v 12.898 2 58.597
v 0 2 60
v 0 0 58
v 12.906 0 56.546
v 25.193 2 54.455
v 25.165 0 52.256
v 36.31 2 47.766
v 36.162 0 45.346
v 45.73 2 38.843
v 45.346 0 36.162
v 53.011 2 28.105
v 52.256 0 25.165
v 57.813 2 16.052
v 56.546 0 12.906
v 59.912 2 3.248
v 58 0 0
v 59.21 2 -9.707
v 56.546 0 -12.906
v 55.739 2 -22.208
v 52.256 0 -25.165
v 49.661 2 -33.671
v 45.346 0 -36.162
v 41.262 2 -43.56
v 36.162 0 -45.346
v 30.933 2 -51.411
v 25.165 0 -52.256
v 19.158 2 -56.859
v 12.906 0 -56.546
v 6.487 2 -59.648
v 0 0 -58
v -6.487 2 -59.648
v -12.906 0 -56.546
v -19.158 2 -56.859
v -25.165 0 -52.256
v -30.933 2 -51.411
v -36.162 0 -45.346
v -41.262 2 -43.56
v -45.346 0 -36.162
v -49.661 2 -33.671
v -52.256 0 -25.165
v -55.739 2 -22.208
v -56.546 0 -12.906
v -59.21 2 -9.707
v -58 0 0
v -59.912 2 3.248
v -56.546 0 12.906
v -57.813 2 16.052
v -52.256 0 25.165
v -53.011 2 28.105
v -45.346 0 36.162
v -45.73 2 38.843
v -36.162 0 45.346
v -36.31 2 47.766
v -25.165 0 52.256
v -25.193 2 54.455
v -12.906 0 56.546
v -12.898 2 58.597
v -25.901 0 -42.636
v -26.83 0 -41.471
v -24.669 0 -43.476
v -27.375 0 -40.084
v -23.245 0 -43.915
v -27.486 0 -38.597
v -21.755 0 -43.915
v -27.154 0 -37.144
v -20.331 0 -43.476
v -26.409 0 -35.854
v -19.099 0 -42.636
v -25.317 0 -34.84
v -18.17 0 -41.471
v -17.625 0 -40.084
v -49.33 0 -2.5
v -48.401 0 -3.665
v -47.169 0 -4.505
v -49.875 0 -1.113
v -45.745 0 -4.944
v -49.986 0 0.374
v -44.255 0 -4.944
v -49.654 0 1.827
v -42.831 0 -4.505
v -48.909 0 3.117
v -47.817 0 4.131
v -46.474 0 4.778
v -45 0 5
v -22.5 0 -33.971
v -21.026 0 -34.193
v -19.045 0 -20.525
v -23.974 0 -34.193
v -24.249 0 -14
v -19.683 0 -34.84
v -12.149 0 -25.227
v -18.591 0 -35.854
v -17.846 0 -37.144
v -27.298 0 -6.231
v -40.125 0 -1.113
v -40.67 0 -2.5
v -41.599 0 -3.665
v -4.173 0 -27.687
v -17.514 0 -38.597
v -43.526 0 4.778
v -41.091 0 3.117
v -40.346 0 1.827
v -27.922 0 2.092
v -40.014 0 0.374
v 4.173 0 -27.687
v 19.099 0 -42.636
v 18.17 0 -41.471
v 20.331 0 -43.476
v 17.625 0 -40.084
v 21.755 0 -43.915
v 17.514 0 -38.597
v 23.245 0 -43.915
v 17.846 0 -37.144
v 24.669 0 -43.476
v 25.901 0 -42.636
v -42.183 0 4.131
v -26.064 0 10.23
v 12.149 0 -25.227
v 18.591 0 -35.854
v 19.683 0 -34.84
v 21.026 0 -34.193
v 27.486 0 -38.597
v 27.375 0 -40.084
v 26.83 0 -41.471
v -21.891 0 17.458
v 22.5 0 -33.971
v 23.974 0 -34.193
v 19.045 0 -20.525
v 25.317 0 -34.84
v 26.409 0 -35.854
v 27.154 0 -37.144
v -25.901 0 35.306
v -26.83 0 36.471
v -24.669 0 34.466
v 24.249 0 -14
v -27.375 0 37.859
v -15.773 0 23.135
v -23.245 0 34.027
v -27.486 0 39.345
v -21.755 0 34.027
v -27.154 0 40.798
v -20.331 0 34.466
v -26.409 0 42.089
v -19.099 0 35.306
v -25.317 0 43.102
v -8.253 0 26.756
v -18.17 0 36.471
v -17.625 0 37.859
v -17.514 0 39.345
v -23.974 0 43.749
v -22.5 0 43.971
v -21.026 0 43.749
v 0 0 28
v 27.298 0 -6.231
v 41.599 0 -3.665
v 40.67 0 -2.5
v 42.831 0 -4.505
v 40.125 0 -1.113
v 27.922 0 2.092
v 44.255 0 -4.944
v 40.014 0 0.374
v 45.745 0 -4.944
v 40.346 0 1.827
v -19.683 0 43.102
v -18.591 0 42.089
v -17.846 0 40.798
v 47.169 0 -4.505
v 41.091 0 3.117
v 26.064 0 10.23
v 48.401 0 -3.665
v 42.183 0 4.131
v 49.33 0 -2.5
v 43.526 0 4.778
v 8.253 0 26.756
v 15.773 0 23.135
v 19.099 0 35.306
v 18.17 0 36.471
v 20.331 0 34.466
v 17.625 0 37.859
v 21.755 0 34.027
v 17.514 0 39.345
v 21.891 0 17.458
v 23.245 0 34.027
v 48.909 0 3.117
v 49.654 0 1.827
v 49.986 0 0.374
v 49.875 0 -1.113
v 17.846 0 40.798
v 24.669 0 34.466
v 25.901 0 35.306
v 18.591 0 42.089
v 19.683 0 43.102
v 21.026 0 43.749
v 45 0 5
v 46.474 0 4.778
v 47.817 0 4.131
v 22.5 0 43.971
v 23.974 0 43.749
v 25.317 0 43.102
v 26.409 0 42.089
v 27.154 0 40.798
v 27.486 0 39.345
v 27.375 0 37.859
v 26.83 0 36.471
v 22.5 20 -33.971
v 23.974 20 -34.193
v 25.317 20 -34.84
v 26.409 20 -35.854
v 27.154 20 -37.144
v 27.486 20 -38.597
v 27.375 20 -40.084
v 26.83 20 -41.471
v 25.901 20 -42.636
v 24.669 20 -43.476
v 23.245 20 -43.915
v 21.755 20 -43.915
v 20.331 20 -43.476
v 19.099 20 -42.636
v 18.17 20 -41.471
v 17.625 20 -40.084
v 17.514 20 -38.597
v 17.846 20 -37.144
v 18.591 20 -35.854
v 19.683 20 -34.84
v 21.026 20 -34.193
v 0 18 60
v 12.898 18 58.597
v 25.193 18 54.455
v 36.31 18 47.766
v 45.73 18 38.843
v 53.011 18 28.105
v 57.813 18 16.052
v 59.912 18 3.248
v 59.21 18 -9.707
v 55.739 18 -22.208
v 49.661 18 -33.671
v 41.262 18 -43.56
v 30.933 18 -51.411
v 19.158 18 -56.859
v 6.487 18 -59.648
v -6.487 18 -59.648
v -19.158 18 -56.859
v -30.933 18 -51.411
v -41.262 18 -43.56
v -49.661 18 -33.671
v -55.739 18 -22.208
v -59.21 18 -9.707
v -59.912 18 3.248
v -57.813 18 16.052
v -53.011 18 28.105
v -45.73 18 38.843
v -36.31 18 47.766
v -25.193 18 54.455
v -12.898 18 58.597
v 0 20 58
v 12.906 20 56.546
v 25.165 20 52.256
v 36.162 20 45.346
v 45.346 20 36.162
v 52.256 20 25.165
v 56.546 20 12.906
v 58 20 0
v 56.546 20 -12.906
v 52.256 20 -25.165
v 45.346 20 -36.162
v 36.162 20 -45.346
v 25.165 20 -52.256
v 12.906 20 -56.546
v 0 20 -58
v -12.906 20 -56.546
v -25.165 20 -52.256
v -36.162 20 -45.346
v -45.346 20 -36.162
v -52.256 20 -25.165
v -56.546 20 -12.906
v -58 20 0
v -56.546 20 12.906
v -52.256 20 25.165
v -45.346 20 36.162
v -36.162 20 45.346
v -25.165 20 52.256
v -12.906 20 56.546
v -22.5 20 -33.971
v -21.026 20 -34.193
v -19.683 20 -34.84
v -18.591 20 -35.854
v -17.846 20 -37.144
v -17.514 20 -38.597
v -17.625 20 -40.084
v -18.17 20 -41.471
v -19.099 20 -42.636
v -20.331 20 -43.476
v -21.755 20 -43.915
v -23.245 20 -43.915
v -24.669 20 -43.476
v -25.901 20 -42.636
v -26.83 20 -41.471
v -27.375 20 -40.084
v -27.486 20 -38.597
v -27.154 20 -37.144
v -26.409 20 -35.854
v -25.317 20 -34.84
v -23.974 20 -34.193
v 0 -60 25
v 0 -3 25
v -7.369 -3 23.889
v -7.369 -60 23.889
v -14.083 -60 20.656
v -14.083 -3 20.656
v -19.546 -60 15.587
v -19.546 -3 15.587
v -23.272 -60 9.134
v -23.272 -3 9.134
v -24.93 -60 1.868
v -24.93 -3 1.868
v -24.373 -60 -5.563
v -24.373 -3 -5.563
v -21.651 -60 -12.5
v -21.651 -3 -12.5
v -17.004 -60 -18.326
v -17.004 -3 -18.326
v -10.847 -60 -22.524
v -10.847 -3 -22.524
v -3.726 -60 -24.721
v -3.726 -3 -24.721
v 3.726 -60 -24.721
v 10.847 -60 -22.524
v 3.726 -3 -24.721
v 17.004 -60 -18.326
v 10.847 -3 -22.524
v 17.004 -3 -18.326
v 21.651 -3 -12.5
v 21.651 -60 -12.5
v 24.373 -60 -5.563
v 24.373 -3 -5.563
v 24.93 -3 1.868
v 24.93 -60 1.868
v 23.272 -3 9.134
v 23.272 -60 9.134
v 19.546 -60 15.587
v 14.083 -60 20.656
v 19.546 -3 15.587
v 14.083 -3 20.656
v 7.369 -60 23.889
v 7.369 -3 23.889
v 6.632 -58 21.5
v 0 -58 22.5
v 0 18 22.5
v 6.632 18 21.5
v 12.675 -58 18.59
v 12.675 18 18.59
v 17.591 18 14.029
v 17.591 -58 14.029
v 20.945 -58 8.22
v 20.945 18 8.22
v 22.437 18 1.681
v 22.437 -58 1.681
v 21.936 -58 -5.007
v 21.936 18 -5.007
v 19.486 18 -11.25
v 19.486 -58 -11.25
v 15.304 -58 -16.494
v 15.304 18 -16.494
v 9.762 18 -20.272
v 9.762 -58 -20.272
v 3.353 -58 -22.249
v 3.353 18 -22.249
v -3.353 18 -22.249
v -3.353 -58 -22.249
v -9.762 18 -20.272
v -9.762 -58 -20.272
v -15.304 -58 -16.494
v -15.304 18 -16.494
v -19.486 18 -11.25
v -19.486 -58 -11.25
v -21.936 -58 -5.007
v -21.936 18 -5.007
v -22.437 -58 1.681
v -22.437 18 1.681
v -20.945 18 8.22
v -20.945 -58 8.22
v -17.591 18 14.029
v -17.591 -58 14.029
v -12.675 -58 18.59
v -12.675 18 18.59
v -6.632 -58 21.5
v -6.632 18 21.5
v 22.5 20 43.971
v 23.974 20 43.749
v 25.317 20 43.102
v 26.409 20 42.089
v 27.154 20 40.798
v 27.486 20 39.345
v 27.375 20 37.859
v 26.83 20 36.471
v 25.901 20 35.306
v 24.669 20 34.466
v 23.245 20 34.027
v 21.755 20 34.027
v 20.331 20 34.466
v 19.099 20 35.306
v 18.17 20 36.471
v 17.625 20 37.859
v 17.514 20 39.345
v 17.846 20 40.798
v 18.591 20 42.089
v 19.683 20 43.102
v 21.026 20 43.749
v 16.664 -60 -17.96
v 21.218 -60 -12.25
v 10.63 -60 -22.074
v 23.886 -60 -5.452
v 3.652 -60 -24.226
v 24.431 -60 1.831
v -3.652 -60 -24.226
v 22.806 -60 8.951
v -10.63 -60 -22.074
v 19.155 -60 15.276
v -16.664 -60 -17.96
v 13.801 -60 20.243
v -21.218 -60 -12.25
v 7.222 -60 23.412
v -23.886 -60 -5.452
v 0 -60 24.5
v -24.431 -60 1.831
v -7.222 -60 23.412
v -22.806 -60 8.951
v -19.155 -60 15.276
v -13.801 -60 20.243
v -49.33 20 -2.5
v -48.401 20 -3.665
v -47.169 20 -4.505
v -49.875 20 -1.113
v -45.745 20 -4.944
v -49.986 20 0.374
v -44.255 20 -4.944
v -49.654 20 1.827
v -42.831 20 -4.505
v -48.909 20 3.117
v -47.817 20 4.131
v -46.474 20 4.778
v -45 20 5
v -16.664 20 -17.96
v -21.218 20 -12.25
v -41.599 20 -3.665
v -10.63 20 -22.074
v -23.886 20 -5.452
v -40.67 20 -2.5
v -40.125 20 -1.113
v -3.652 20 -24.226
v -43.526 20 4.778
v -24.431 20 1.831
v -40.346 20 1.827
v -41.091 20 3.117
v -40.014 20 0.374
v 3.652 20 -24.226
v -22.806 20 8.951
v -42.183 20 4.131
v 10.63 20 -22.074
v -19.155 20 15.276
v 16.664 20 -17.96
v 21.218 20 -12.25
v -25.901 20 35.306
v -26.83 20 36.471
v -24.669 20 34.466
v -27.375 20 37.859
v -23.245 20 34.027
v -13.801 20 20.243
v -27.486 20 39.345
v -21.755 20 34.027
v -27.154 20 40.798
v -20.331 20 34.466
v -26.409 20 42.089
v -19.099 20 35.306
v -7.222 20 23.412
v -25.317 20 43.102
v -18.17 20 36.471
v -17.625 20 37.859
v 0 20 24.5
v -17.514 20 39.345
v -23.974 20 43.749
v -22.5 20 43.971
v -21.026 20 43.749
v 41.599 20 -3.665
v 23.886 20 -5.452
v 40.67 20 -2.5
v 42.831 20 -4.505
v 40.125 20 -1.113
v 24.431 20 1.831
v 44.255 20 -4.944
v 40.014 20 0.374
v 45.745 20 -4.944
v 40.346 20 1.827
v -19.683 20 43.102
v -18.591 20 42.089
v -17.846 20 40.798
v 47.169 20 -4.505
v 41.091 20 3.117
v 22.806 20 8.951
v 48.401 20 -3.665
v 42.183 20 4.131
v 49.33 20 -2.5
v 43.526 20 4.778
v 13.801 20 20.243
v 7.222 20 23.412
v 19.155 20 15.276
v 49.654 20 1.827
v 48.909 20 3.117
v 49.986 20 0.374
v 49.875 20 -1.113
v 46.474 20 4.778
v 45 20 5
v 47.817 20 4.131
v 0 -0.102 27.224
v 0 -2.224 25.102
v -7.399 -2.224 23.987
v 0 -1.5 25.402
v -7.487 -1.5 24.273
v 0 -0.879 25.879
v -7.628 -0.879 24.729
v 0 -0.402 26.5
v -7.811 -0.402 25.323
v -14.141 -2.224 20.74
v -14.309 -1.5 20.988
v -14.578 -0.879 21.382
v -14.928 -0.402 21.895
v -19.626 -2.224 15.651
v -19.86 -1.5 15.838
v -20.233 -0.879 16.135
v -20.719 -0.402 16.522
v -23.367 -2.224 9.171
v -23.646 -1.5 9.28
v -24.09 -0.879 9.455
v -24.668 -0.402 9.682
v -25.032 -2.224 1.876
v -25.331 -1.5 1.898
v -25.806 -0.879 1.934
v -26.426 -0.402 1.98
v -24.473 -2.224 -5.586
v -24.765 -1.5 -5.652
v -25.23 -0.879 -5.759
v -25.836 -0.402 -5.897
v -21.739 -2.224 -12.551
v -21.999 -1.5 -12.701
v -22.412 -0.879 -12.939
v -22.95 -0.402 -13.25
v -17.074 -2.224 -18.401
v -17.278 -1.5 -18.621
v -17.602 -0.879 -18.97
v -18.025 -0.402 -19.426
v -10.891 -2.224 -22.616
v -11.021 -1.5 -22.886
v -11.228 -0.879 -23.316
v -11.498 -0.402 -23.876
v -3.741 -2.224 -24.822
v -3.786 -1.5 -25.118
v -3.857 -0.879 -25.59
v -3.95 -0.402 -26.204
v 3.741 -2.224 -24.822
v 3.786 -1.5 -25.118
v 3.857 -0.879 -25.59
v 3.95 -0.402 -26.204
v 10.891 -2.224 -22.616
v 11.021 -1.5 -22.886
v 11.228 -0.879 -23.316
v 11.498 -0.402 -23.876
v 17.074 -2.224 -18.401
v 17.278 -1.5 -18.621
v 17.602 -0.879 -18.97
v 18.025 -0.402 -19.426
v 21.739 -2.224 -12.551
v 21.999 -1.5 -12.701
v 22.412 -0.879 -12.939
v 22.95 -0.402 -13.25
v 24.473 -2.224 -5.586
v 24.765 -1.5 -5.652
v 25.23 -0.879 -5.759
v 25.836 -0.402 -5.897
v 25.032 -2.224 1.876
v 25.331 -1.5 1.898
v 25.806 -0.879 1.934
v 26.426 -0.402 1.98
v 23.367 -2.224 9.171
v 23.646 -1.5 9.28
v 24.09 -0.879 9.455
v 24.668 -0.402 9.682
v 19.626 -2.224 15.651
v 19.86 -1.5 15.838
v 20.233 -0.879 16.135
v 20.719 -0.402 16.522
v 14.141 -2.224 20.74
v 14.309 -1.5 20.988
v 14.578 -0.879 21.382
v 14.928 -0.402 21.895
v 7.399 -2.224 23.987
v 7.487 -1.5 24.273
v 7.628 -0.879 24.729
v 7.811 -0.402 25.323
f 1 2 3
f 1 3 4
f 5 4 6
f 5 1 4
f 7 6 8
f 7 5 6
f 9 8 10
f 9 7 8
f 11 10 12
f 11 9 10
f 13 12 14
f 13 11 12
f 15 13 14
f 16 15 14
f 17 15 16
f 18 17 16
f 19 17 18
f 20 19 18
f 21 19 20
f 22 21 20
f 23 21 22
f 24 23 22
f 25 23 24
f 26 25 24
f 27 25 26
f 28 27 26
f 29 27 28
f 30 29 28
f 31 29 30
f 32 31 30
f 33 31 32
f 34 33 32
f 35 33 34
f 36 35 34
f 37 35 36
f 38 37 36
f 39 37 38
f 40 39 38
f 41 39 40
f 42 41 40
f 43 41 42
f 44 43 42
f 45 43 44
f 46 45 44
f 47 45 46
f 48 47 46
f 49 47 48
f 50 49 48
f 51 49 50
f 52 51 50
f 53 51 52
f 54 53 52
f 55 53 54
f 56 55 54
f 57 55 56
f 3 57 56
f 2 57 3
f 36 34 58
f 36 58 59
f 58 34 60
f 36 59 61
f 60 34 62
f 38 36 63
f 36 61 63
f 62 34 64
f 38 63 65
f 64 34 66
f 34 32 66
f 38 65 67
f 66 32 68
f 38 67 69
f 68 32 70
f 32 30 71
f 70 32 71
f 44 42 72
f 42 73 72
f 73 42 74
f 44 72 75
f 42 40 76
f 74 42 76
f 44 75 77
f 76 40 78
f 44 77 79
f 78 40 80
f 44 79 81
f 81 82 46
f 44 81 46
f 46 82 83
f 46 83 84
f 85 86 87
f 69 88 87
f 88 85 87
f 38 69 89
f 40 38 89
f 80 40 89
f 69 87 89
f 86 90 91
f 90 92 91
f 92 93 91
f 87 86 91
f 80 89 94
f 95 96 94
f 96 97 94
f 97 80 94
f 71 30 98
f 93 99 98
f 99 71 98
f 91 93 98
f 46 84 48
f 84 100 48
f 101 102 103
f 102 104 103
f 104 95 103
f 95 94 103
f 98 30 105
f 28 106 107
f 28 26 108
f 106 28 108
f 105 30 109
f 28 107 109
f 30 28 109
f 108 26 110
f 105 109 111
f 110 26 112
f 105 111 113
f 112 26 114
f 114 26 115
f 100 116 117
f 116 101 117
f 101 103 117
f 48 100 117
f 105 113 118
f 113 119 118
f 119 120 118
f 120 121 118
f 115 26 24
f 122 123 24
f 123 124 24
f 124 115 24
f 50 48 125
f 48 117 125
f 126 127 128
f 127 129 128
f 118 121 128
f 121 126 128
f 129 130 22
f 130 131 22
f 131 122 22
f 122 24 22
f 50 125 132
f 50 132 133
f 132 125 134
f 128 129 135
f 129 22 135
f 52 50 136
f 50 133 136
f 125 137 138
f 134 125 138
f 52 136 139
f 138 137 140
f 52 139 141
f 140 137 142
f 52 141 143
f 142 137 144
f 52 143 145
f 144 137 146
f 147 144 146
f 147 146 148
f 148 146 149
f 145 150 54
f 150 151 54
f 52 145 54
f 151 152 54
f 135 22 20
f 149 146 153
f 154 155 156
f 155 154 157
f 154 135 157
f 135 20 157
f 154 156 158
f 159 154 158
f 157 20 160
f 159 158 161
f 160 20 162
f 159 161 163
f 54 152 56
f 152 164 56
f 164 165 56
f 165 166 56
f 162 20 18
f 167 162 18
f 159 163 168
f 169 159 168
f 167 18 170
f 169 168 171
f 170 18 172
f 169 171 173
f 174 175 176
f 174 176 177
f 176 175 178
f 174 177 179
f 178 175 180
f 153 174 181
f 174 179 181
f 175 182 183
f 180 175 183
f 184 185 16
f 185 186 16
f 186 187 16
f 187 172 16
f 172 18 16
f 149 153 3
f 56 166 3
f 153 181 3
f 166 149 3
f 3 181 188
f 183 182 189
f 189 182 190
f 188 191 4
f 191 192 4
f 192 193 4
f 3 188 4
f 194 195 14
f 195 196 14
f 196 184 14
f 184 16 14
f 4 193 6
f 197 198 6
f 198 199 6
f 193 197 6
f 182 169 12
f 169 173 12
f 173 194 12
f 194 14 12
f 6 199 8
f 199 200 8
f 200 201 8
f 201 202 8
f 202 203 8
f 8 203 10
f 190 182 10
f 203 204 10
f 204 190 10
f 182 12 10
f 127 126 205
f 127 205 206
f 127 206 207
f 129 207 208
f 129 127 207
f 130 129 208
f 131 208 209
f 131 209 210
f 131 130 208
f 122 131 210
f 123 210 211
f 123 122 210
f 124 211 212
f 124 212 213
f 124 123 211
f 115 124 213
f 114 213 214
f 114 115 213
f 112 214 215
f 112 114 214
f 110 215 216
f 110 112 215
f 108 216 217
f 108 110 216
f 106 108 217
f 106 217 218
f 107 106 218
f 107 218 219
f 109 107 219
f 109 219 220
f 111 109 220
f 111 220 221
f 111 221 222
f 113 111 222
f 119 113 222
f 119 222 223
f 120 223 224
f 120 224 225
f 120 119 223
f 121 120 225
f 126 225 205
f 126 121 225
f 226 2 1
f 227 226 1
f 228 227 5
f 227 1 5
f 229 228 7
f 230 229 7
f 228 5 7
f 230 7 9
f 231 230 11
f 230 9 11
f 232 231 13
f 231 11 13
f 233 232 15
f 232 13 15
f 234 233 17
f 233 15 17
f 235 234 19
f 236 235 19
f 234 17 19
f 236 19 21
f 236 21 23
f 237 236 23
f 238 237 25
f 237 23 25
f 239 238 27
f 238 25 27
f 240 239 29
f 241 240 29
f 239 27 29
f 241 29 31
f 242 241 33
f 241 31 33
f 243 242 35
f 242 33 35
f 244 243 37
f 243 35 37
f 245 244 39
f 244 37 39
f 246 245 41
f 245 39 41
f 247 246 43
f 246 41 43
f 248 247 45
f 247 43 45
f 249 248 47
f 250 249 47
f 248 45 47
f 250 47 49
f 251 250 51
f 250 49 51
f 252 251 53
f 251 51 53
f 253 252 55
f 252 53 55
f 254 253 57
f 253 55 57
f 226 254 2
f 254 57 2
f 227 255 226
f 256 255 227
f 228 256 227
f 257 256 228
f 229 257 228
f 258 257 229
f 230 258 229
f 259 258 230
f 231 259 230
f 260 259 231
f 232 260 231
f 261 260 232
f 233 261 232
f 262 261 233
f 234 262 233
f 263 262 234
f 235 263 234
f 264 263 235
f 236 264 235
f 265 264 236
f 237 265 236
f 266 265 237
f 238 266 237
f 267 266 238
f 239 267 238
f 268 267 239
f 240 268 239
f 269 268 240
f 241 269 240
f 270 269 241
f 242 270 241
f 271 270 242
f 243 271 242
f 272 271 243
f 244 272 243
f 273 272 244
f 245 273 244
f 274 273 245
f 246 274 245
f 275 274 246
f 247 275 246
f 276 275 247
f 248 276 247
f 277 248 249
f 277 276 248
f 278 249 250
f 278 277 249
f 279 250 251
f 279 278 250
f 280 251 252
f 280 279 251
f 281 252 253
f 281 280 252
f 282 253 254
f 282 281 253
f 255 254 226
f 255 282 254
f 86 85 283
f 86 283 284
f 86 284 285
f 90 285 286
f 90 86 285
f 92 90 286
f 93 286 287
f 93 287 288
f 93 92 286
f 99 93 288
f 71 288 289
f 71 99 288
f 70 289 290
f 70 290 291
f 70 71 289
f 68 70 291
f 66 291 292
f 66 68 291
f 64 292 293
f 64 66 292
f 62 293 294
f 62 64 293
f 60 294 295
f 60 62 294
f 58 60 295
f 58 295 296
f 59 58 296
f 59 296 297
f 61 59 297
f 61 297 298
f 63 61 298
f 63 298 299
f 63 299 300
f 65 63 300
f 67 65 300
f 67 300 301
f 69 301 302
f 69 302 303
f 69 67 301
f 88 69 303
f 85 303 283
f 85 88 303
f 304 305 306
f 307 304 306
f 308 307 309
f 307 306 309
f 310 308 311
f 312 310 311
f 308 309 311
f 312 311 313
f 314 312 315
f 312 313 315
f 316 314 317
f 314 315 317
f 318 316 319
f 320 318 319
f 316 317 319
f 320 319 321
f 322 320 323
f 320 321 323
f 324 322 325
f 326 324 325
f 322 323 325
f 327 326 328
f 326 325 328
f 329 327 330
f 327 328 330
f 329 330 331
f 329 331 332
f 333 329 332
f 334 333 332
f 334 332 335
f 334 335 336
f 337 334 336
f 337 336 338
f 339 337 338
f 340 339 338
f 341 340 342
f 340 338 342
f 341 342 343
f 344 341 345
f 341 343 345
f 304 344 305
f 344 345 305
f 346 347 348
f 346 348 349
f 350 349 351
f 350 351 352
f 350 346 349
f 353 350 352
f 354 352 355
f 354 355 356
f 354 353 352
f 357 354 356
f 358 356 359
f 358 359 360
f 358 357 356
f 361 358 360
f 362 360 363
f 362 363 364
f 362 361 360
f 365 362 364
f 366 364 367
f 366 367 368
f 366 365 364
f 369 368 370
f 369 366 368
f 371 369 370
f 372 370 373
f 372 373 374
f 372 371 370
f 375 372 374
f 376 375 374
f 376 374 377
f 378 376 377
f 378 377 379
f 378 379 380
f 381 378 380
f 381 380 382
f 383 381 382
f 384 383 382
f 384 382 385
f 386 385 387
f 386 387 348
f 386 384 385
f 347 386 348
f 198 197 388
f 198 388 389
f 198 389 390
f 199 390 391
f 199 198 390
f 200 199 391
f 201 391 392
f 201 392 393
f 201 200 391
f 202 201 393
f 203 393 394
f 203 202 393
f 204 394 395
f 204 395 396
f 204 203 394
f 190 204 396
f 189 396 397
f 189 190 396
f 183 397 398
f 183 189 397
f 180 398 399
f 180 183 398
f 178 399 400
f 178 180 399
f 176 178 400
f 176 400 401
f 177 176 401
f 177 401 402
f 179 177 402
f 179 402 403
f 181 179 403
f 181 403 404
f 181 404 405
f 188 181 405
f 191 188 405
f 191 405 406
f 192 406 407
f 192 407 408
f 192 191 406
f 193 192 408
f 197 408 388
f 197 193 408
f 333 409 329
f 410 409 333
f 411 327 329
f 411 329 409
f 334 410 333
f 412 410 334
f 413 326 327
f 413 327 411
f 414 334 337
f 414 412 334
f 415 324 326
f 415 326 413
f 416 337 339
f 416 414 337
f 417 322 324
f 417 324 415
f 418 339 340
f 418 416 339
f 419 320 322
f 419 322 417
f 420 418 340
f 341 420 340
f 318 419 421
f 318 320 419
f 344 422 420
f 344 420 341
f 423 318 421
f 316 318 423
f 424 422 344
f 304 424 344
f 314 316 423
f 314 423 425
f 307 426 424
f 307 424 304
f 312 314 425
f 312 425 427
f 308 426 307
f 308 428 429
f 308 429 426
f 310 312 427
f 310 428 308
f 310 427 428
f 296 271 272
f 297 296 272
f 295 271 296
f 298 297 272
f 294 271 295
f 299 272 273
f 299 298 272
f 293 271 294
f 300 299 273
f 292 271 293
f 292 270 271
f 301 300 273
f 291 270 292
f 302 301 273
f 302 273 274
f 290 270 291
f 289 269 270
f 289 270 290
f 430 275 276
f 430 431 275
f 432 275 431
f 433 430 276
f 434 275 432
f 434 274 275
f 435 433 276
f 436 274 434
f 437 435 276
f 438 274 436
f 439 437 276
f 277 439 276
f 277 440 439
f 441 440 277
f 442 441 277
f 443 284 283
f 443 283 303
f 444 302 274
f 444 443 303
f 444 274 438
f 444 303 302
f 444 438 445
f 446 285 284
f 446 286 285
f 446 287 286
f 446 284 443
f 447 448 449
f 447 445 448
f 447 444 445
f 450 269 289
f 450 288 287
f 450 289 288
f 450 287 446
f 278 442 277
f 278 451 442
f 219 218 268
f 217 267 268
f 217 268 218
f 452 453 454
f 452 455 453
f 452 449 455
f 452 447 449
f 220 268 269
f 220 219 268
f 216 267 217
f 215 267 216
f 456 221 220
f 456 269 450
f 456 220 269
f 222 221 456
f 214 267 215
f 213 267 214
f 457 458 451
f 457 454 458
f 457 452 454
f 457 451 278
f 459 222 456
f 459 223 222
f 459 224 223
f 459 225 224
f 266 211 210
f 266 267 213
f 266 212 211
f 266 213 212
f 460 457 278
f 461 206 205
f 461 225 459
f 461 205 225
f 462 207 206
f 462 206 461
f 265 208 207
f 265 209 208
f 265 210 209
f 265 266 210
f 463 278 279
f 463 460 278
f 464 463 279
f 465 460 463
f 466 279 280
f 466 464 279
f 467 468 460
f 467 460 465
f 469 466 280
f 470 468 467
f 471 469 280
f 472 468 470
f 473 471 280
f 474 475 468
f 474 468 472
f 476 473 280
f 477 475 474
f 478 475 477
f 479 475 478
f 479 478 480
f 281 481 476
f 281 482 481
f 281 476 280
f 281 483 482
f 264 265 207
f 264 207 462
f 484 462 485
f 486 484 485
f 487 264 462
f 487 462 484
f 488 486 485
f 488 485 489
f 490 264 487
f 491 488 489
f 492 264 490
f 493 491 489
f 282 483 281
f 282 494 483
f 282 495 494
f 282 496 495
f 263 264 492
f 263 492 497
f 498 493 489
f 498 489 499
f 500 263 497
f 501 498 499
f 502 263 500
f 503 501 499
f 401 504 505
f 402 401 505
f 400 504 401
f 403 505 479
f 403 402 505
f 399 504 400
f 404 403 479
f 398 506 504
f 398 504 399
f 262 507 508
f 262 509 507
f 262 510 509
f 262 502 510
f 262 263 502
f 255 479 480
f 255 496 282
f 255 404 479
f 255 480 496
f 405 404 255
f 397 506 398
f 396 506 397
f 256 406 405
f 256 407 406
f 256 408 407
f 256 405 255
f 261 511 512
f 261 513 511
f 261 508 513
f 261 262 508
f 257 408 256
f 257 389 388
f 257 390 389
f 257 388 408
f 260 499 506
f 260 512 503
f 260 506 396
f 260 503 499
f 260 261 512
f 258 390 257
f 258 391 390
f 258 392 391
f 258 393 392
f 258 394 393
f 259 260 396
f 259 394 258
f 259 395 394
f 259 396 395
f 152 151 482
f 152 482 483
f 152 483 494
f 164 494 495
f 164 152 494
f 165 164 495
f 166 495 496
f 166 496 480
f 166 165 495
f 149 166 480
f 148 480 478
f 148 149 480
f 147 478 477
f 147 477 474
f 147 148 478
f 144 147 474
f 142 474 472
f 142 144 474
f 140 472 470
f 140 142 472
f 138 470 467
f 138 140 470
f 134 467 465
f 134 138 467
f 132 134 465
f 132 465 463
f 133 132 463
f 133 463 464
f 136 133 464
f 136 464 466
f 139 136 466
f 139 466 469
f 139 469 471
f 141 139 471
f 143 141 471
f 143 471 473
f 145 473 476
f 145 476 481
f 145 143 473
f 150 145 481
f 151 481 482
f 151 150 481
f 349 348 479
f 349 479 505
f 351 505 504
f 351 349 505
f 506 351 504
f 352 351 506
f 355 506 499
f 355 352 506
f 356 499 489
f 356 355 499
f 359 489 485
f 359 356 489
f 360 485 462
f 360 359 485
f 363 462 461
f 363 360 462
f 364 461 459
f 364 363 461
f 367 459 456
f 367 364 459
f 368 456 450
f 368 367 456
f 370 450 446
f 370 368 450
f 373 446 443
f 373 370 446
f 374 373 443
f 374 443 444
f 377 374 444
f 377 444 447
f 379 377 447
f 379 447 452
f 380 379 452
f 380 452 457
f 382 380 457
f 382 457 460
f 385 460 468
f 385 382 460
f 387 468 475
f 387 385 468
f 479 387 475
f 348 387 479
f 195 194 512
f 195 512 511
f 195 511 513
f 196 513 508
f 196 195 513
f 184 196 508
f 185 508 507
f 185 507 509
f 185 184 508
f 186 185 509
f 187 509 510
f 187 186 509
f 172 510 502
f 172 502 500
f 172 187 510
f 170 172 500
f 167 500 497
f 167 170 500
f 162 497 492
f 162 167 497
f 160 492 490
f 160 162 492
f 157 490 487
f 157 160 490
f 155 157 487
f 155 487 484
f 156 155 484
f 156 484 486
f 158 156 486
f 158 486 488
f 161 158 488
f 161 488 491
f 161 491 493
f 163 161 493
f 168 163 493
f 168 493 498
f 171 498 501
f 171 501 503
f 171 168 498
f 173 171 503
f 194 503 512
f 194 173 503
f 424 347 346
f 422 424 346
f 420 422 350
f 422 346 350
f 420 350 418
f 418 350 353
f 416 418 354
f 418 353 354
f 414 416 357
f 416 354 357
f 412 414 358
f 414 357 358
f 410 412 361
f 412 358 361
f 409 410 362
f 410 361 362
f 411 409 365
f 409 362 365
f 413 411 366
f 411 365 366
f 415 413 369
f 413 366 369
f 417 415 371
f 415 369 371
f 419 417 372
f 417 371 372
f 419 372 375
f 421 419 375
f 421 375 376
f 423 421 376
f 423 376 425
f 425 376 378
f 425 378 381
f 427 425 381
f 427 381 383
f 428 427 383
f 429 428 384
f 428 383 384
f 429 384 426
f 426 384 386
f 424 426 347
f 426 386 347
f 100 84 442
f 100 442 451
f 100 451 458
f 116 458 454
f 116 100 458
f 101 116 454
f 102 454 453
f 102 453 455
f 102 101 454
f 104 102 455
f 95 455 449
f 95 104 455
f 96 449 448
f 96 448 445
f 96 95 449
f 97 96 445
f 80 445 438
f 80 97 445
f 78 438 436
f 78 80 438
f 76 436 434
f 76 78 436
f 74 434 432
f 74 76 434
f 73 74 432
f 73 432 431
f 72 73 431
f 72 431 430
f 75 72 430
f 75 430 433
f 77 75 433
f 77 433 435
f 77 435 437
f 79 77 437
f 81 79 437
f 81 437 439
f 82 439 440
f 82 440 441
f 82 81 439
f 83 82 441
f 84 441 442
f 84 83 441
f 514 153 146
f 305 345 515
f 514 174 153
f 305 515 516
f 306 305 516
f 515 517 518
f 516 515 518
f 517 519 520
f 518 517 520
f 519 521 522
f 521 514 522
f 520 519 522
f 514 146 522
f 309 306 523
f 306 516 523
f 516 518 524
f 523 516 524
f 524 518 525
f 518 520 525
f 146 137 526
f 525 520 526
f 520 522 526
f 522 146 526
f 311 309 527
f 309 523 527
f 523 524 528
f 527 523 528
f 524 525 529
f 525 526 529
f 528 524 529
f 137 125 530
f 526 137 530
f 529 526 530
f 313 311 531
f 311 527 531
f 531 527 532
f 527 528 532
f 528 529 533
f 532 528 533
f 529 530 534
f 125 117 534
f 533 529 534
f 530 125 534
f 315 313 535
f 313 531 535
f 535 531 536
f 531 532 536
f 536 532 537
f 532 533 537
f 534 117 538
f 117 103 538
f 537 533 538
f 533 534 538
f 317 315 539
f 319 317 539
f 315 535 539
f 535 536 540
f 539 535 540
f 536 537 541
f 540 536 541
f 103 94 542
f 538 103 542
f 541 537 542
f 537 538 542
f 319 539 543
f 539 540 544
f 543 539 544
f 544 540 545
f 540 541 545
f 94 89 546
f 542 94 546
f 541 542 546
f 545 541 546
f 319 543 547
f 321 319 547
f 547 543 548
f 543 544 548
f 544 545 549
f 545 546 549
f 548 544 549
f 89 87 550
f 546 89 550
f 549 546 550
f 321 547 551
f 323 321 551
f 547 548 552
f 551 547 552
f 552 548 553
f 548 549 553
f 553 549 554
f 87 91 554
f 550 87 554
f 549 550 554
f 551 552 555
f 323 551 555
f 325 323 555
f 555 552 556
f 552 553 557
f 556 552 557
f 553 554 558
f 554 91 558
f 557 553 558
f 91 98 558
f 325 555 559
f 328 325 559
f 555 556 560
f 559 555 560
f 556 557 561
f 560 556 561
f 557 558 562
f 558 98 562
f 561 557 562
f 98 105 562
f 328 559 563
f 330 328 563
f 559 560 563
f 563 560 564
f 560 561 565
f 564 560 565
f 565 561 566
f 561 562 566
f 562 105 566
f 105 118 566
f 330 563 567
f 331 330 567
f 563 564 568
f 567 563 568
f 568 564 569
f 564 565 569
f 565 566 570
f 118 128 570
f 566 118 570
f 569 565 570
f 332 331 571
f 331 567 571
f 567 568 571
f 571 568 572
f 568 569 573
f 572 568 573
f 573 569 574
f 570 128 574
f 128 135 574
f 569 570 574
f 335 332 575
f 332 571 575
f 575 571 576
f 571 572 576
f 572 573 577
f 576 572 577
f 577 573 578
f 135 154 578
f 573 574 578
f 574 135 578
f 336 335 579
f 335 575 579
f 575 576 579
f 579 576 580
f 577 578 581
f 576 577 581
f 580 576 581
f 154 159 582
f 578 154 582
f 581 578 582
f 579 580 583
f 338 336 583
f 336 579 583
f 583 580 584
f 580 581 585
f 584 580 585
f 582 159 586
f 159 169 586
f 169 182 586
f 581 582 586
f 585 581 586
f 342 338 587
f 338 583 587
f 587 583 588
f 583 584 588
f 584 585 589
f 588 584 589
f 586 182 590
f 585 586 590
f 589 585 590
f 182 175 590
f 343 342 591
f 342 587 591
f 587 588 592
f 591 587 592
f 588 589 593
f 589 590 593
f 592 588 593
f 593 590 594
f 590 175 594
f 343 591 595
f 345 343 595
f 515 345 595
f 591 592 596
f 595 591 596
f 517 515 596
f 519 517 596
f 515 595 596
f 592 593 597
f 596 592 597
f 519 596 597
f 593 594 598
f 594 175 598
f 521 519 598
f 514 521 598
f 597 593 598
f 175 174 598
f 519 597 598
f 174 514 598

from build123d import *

# Parameters (mm, degrees)
SKETCH2_R           = 60
SKETCH2_R_2         = 22.5
SKETCH2_R_3         = 5
BOSS_EXTRUDE1_DEPTH = 20
CHAMFER1_SIZE       = 2
CHAMFER2_SIZE       = 2
SKETCH3_R           = 25
BOSS_EXTRUDE2_DEPTH = 60
FILLET1_R           = 3
CUT_EXTRUDE1_START  = -60
SKETCH2_2_R         = 22.5
CUT_EXTRUDE1_DEPTH  = 60
CHAMFER3_SIZE       = 2
CHAMFER4_SIZE       = 2


with BuildPart() as part:
    # Sketch2 → Boss-Extrude1 (new body)
    with BuildSketch(Plane(origin=(0, 0, 0), x_dir=(1, 0, 0), z_dir=(0, 1, 0))):
        Circle(SKETCH2_R)
        Circle(SKETCH2_R_2, mode=Mode.SUBTRACT)
        with Locations((45, 0)):
            Circle(SKETCH2_R_3, mode=Mode.SUBTRACT)
        with Locations((22.5, -38.97114317)):
            Circle(SKETCH2_R_3, mode=Mode.SUBTRACT)
        with Locations((-22.5, -38.97114317)):
            Circle(SKETCH2_R_3, mode=Mode.SUBTRACT)
        with Locations((-45, 0)):
            Circle(SKETCH2_R_3, mode=Mode.SUBTRACT)
        with Locations((-22.5, 38.97114317)):
            Circle(SKETCH2_R_3, mode=Mode.SUBTRACT)
        with Locations((22.5, 38.97114317)):
            Circle(SKETCH2_R_3, mode=Mode.SUBTRACT)
    extrude(amount=BOSS_EXTRUDE1_DEPTH)

    # Chamfer1
    chamfer1_edges = [part.edges().sort_by_distance(p)[0] for p in [
        (-60, 20, 0),
    ]]
    chamfer(chamfer1_edges, length=CHAMFER1_SIZE)

    # Chamfer2
    chamfer2_edges = [part.edges().sort_by_distance(p)[0] for p in [
        (-22.5, 20, 0),
    ]]
    chamfer(chamfer2_edges, length=CHAMFER2_SIZE)

    # Sketch3 → Boss-Extrude2 (add)
    with BuildSketch(Plane(origin=(0, 0, 0), x_dir=(-1, 0, 0), z_dir=(0, -1, 0))):
        Circle(SKETCH3_R)
    extrude(amount=BOSS_EXTRUDE2_DEPTH)

    # Fillet1
    fillet1_edges = [part.edges().sort_by_distance(p)[0] for p in [
        (25, 0, 0),
    ]]
    fillet(fillet1_edges, radius=FILLET1_R)

    # Sketch2<2> → Cut-Extrude1 (cut)
    with BuildSketch(Plane(origin=(0, 0, 0), x_dir=(1, 0, 0), z_dir=(0, 1, 0)).offset(CUT_EXTRUDE1_START)):
        Circle(SKETCH2_2_R)
    extrude(amount=CUT_EXTRUDE1_DEPTH, mode=Mode.SUBTRACT)

    # Chamfer3
    chamfer3_edges = [part.edges().sort_by_distance(p)[0] for p in [
        (-22.5, -60, 0),
    ]]
    chamfer(chamfer3_edges, length=CHAMFER3_SIZE)

    # Chamfer4
    chamfer4_edges = [part.edges().sort_by_distance(p)[0] for p in [
        (-60, 0, 0),
    ]]
    chamfer(chamfer4_edges, length=CHAMFER4_SIZE)


solid = part.part
